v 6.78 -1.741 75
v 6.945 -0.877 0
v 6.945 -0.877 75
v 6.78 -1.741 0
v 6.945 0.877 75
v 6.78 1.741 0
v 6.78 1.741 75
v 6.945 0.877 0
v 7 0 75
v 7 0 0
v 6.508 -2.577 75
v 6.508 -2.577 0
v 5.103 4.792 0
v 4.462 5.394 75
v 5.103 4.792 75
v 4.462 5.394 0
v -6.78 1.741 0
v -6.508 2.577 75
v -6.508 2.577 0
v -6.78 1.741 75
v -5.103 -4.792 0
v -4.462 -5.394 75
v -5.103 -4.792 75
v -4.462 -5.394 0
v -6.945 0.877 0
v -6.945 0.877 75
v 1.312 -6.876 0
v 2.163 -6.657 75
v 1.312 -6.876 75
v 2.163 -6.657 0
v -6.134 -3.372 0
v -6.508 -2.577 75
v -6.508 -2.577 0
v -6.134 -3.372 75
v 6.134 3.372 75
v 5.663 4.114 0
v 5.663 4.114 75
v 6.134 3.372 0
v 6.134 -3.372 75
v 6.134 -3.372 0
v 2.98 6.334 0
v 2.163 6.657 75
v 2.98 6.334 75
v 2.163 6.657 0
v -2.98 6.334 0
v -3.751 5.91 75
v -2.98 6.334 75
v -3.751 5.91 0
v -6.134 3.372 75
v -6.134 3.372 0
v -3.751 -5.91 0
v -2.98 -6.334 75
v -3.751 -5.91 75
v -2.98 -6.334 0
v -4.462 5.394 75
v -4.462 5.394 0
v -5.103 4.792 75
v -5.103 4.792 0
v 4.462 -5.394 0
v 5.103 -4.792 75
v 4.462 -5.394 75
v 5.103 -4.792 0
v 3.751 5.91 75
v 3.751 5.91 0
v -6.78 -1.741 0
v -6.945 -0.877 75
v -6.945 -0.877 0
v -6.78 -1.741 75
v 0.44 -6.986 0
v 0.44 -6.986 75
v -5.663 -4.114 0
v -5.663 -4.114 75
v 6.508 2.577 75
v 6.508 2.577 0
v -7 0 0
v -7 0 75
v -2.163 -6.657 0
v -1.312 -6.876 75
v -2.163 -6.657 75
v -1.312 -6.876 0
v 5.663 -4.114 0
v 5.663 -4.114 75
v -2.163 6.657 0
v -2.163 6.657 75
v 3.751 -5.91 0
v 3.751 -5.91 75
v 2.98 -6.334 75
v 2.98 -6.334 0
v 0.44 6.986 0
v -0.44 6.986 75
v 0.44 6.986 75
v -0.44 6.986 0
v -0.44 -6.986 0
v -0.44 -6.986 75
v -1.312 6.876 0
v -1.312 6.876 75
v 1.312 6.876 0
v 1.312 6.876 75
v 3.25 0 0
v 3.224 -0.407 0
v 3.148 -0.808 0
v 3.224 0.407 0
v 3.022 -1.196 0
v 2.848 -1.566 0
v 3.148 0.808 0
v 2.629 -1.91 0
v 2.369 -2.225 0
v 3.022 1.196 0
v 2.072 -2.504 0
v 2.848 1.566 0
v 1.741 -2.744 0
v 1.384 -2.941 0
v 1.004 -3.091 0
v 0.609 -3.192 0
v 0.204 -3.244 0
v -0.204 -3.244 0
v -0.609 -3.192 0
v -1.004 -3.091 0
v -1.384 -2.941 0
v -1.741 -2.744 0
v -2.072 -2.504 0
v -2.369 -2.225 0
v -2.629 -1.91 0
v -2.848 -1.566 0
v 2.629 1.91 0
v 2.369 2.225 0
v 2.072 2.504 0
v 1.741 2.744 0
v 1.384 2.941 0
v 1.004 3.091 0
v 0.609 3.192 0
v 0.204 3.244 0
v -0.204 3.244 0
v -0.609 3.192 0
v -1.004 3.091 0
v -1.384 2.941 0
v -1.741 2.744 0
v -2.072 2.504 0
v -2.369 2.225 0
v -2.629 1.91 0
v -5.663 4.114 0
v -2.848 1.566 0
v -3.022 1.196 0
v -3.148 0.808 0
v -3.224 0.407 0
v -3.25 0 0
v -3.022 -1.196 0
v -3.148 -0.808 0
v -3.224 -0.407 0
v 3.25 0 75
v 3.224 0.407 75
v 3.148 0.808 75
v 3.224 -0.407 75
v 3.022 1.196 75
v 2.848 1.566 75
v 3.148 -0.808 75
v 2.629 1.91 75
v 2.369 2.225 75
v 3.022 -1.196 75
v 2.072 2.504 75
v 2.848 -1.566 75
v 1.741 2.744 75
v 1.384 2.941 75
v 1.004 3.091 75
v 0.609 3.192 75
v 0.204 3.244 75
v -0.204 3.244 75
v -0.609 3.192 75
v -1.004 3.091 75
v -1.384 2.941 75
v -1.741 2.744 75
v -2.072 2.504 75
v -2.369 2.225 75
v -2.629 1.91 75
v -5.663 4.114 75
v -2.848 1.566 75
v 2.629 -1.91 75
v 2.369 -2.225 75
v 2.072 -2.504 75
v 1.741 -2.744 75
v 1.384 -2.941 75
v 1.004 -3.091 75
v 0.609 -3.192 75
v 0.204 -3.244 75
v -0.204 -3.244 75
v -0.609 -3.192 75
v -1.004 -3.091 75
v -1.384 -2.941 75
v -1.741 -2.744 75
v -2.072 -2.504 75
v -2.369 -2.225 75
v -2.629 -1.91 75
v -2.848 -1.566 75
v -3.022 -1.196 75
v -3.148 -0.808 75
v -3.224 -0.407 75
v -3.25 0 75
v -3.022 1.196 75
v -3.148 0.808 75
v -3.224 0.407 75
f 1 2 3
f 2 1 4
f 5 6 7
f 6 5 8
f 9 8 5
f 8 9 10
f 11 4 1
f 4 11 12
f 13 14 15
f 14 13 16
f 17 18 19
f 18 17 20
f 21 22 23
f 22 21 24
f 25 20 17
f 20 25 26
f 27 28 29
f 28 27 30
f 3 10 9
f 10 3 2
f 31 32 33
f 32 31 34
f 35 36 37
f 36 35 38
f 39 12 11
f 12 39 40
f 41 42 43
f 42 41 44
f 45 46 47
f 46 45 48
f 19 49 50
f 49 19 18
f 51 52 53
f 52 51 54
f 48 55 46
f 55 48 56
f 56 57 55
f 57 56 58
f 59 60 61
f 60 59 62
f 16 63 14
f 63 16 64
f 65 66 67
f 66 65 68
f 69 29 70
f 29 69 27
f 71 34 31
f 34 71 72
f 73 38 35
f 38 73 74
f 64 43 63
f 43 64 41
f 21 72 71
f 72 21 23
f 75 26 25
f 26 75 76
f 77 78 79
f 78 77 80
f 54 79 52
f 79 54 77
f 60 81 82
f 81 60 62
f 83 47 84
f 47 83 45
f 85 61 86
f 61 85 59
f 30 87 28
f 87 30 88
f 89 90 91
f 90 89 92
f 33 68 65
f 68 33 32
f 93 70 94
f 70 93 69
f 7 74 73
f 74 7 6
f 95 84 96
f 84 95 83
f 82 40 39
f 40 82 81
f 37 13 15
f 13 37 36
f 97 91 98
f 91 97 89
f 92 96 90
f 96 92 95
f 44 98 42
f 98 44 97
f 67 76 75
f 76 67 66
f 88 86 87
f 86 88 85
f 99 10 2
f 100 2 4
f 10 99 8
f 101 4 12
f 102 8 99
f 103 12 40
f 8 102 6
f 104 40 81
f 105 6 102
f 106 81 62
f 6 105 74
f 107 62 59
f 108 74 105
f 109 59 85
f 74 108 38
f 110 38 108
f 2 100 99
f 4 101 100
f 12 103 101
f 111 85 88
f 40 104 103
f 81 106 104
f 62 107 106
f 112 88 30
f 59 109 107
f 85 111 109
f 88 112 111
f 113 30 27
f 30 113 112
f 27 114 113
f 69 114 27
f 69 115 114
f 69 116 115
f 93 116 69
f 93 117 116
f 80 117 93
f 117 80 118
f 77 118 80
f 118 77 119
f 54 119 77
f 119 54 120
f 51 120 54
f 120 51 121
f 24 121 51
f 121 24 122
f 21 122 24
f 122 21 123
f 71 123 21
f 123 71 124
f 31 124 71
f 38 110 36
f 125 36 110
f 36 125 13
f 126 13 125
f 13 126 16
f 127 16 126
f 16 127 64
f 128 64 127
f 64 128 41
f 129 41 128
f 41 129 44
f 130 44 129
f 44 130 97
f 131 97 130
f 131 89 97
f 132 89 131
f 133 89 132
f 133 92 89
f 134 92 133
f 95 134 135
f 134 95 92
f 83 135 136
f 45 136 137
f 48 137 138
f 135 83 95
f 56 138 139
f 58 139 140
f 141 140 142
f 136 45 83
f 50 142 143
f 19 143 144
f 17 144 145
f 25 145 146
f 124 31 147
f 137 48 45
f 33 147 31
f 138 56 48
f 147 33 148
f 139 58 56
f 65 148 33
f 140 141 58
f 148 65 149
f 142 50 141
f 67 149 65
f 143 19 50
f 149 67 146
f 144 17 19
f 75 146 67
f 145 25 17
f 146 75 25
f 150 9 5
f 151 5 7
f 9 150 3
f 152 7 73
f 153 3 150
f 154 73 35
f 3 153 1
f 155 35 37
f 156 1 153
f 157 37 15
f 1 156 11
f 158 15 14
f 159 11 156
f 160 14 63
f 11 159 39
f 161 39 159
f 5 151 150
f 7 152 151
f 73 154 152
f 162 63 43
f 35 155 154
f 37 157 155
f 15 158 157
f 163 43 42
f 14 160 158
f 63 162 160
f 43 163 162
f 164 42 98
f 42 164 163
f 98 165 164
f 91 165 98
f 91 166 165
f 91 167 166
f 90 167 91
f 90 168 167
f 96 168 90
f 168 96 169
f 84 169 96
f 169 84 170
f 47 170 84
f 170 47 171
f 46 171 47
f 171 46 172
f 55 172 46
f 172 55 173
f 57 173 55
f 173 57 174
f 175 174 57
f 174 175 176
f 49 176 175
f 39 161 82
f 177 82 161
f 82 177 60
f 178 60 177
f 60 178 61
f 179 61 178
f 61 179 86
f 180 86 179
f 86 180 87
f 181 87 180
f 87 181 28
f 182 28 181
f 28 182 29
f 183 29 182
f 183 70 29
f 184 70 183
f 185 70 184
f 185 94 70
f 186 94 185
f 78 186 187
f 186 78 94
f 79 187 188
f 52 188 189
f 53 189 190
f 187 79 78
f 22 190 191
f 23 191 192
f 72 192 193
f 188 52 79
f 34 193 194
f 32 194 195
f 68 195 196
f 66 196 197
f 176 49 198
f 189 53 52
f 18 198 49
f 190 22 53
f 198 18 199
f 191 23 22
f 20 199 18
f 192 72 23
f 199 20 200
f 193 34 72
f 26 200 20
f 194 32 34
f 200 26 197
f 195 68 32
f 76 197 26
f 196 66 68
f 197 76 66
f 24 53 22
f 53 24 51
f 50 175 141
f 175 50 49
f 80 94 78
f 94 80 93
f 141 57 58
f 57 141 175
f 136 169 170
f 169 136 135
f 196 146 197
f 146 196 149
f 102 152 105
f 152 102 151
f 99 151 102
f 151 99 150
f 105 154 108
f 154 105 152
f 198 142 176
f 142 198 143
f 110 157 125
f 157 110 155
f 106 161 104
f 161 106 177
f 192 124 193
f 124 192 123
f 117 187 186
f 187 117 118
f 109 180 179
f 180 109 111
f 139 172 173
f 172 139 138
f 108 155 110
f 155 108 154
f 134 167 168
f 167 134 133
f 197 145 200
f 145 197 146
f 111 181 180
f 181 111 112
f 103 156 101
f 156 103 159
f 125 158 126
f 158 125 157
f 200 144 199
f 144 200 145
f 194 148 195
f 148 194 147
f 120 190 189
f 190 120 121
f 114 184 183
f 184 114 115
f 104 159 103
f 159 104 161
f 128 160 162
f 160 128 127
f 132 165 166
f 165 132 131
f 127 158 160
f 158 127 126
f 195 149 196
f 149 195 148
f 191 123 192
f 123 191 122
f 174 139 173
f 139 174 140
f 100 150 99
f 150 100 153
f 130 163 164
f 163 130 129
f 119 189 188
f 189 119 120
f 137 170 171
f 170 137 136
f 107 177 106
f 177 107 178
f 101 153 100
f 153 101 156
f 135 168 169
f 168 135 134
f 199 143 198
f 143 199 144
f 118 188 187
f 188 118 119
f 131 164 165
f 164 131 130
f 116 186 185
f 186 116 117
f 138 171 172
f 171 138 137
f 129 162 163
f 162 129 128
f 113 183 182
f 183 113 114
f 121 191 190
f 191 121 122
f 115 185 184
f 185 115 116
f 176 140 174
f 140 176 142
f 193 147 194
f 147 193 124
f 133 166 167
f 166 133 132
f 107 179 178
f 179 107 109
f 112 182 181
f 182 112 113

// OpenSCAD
$fn = 50;


difference() {
	union() {
		cylinder(h = 75, r = 7.0000000000);
	}
	union() {
		translate(v = [0.0000000000, 0.0000000000, -100.0000000000]) {
			cylinder(h = 200, r = 3.2500000000);
		}
	}
}
